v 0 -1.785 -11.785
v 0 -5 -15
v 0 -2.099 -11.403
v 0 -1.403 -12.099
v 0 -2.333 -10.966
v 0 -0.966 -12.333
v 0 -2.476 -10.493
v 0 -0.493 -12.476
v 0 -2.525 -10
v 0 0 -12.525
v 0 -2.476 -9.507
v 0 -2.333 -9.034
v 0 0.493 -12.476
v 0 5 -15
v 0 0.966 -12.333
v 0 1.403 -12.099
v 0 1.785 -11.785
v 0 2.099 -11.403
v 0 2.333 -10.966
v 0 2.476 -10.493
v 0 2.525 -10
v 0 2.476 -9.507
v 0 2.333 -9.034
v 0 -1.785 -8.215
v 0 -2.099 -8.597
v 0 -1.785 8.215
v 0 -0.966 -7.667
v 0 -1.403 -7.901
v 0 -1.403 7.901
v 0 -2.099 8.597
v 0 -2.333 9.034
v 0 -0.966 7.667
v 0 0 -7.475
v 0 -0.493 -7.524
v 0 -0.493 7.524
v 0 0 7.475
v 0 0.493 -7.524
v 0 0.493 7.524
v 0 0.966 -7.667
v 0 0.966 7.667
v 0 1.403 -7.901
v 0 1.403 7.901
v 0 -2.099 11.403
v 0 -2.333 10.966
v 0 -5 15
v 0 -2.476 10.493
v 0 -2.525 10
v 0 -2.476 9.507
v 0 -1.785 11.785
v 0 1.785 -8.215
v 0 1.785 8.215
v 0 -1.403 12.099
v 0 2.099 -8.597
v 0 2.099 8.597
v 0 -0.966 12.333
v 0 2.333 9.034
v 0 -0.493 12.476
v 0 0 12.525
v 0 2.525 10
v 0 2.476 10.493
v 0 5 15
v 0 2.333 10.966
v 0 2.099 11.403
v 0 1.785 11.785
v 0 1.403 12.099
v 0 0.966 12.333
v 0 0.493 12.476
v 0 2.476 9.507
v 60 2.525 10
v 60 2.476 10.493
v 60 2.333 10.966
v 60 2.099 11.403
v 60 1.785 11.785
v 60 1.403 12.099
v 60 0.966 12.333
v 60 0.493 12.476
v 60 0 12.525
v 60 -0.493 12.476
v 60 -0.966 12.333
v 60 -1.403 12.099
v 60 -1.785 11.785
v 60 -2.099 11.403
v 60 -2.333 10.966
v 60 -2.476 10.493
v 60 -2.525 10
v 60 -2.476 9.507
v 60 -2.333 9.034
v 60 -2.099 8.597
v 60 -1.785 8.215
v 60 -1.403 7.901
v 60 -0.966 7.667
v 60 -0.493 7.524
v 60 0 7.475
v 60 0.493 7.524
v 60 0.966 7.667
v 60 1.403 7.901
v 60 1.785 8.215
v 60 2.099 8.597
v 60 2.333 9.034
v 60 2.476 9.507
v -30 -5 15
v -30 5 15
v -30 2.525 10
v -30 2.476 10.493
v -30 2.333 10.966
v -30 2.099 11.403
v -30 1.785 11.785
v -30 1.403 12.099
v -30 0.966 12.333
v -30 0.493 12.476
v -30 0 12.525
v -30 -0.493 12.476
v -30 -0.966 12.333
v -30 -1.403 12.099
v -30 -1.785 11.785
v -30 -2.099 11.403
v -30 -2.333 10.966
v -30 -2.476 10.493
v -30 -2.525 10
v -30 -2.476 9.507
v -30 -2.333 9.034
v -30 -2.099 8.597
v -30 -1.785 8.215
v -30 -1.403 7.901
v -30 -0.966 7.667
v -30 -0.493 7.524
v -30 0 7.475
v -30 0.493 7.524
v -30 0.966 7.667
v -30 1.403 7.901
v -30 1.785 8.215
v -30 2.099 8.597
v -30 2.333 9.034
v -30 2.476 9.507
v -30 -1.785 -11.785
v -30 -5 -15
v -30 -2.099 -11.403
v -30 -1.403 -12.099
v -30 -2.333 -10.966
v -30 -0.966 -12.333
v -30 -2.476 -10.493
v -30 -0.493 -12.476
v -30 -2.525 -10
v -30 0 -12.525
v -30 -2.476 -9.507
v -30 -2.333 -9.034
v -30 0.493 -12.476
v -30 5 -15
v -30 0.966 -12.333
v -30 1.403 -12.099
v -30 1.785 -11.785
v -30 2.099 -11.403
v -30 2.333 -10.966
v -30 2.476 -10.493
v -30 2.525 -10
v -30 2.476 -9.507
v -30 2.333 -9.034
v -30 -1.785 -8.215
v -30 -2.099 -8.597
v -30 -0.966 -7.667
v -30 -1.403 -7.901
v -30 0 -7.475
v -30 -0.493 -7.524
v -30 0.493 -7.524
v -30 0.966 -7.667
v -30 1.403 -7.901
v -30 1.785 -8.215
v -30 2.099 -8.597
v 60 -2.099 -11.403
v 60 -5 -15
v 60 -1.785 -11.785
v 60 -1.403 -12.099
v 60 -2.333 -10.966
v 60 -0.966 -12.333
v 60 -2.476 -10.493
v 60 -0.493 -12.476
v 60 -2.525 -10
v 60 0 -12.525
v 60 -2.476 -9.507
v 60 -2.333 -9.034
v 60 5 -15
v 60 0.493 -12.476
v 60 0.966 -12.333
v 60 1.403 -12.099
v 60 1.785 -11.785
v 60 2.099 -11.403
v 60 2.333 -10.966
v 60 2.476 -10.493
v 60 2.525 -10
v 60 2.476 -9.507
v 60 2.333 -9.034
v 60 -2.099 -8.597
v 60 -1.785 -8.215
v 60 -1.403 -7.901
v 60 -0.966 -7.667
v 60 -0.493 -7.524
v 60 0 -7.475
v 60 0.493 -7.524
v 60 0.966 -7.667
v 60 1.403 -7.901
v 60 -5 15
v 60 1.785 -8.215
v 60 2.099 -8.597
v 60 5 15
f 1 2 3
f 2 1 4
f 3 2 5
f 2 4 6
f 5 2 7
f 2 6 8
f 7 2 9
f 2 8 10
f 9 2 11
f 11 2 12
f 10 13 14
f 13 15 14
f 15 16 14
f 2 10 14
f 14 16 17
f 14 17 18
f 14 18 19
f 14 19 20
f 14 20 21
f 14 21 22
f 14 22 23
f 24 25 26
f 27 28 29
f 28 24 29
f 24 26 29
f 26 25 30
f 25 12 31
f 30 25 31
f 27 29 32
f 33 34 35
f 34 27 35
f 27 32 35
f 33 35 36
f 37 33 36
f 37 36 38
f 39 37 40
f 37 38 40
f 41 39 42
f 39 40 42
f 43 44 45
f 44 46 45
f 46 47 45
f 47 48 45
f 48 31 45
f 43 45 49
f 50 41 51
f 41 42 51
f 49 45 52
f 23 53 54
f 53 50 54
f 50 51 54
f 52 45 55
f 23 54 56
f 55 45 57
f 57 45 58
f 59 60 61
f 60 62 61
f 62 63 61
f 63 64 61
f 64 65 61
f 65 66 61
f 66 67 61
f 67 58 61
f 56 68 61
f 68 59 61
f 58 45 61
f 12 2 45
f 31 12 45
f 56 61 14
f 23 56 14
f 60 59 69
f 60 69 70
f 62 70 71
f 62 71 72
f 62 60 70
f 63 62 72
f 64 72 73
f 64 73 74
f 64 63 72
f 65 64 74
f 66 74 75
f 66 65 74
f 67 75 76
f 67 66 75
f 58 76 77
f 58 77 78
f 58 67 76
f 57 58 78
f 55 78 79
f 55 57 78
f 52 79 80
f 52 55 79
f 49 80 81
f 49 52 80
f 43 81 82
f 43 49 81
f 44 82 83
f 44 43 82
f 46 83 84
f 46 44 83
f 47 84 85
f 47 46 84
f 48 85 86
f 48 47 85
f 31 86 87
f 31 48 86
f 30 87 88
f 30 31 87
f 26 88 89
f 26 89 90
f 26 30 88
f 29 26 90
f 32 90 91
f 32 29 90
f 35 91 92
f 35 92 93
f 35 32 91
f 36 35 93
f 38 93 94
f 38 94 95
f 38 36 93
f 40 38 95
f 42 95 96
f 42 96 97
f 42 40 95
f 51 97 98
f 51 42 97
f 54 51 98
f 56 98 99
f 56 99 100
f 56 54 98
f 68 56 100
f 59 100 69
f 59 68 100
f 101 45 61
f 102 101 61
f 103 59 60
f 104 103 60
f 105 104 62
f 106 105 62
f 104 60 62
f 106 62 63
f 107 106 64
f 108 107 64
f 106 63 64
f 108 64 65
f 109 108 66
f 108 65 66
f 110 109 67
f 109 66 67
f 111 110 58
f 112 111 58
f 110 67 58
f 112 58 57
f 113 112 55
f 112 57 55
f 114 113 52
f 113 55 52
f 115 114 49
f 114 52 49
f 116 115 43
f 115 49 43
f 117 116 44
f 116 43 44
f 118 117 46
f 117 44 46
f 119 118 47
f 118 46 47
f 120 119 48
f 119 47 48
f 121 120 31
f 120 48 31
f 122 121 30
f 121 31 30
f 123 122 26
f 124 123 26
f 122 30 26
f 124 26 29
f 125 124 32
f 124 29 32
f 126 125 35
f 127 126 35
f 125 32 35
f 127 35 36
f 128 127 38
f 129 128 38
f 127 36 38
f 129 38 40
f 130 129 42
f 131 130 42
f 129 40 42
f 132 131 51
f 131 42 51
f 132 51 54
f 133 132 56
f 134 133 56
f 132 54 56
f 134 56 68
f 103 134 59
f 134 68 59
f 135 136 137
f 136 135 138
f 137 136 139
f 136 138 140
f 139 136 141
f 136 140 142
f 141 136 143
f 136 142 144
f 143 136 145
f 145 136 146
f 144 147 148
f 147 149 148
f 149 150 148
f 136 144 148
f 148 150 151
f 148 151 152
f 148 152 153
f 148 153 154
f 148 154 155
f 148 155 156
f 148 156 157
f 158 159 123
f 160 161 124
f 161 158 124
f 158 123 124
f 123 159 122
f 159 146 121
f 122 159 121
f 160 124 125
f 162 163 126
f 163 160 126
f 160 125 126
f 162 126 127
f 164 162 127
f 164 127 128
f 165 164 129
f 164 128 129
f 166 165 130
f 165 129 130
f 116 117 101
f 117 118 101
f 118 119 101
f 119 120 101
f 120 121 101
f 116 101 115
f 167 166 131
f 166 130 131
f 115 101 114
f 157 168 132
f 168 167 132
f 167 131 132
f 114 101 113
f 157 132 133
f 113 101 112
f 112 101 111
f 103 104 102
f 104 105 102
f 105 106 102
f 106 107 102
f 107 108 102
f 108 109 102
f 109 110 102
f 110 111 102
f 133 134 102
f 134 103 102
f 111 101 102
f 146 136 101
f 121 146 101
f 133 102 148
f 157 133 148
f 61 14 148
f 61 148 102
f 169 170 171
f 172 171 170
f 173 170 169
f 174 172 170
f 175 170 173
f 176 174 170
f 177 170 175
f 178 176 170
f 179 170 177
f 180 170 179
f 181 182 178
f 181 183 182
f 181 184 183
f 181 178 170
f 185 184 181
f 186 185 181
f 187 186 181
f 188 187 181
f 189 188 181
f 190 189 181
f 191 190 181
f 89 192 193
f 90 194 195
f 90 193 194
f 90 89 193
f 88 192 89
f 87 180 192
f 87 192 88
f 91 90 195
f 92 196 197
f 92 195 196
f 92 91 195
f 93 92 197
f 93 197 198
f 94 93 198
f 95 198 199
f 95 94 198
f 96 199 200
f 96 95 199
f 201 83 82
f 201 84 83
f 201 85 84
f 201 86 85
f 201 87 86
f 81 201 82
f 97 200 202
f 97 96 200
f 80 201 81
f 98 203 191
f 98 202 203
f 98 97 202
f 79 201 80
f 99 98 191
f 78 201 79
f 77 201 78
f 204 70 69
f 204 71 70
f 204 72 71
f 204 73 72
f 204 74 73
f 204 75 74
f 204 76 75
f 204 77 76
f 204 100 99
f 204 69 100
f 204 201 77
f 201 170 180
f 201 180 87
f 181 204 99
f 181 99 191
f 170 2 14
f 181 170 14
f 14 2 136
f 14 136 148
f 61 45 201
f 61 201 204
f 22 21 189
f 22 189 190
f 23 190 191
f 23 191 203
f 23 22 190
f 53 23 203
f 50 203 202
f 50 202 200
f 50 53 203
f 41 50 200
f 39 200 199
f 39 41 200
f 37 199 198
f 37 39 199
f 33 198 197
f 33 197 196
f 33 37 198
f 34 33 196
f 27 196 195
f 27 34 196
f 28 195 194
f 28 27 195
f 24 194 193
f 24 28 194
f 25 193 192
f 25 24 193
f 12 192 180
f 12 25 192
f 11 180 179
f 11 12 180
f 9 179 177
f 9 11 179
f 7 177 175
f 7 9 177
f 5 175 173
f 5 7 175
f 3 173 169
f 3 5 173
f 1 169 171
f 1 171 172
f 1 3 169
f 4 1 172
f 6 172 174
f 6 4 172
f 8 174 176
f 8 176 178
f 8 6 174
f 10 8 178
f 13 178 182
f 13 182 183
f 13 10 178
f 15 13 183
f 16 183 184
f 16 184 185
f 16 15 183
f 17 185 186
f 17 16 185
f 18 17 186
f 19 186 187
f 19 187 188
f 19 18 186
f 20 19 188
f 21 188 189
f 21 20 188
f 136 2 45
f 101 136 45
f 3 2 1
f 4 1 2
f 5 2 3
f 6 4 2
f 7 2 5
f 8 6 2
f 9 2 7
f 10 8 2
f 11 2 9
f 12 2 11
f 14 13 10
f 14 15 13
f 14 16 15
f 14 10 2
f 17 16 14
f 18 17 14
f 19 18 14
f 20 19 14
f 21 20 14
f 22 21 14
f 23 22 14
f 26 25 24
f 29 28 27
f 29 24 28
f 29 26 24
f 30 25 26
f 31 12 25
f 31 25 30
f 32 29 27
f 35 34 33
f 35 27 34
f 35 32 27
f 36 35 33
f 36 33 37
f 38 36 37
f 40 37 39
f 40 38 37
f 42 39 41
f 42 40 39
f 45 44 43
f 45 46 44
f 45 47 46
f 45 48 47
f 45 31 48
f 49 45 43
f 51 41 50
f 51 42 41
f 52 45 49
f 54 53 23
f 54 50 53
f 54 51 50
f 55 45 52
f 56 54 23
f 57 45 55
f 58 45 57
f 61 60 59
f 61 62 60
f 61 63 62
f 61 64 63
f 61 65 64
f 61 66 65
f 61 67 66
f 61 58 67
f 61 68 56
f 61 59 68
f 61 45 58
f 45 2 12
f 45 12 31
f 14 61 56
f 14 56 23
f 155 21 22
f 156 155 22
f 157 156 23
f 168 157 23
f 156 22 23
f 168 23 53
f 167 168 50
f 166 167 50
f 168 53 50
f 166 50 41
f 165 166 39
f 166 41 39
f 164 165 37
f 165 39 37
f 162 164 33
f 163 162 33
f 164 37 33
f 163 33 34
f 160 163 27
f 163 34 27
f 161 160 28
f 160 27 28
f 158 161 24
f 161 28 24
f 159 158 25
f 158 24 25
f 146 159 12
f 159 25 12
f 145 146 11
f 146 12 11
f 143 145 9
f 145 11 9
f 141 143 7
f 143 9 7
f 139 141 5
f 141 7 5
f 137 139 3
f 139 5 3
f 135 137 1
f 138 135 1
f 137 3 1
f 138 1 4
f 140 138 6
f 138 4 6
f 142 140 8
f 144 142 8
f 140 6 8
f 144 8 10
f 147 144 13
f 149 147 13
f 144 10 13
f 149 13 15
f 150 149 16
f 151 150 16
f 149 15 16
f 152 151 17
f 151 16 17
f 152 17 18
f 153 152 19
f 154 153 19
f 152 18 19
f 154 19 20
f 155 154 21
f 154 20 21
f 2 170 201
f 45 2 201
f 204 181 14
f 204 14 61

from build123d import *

# Parameters (mm, degrees)
F0_W     = 10
F0_H     = 30
F0_R     = 2.525
F1_DEPTH = 60
F2_W     = 10
F2_H     = 30
F2_R     = 2.525
F3_DEPTH = 30


with BuildPart() as f1:
    # F0 (on Right) → F1 (new body)
    with BuildSketch(Plane.YZ):
        Rectangle(F0_W, F0_H)
        with Locations((0, -10)):
            Circle(F0_R, mode=Mode.SUBTRACT)
        with Locations((0, 10)):
            Circle(F0_R, mode=Mode.SUBTRACT)
    extrude(amount=F1_DEPTH)


with BuildPart() as f3:
    # F2 (on Right) → F3 (new body)
    with BuildSketch(Plane.YZ):
        Rectangle(F2_W, F2_H)
        with Locations((0, -10)):
            Circle(F2_R, mode=Mode.SUBTRACT)
        with Locations((0, 10)):
            Circle(F2_R, mode=Mode.SUBTRACT)
    extrude(amount=-F3_DEPTH)


solid = Compound([f1.part, f3.part])
